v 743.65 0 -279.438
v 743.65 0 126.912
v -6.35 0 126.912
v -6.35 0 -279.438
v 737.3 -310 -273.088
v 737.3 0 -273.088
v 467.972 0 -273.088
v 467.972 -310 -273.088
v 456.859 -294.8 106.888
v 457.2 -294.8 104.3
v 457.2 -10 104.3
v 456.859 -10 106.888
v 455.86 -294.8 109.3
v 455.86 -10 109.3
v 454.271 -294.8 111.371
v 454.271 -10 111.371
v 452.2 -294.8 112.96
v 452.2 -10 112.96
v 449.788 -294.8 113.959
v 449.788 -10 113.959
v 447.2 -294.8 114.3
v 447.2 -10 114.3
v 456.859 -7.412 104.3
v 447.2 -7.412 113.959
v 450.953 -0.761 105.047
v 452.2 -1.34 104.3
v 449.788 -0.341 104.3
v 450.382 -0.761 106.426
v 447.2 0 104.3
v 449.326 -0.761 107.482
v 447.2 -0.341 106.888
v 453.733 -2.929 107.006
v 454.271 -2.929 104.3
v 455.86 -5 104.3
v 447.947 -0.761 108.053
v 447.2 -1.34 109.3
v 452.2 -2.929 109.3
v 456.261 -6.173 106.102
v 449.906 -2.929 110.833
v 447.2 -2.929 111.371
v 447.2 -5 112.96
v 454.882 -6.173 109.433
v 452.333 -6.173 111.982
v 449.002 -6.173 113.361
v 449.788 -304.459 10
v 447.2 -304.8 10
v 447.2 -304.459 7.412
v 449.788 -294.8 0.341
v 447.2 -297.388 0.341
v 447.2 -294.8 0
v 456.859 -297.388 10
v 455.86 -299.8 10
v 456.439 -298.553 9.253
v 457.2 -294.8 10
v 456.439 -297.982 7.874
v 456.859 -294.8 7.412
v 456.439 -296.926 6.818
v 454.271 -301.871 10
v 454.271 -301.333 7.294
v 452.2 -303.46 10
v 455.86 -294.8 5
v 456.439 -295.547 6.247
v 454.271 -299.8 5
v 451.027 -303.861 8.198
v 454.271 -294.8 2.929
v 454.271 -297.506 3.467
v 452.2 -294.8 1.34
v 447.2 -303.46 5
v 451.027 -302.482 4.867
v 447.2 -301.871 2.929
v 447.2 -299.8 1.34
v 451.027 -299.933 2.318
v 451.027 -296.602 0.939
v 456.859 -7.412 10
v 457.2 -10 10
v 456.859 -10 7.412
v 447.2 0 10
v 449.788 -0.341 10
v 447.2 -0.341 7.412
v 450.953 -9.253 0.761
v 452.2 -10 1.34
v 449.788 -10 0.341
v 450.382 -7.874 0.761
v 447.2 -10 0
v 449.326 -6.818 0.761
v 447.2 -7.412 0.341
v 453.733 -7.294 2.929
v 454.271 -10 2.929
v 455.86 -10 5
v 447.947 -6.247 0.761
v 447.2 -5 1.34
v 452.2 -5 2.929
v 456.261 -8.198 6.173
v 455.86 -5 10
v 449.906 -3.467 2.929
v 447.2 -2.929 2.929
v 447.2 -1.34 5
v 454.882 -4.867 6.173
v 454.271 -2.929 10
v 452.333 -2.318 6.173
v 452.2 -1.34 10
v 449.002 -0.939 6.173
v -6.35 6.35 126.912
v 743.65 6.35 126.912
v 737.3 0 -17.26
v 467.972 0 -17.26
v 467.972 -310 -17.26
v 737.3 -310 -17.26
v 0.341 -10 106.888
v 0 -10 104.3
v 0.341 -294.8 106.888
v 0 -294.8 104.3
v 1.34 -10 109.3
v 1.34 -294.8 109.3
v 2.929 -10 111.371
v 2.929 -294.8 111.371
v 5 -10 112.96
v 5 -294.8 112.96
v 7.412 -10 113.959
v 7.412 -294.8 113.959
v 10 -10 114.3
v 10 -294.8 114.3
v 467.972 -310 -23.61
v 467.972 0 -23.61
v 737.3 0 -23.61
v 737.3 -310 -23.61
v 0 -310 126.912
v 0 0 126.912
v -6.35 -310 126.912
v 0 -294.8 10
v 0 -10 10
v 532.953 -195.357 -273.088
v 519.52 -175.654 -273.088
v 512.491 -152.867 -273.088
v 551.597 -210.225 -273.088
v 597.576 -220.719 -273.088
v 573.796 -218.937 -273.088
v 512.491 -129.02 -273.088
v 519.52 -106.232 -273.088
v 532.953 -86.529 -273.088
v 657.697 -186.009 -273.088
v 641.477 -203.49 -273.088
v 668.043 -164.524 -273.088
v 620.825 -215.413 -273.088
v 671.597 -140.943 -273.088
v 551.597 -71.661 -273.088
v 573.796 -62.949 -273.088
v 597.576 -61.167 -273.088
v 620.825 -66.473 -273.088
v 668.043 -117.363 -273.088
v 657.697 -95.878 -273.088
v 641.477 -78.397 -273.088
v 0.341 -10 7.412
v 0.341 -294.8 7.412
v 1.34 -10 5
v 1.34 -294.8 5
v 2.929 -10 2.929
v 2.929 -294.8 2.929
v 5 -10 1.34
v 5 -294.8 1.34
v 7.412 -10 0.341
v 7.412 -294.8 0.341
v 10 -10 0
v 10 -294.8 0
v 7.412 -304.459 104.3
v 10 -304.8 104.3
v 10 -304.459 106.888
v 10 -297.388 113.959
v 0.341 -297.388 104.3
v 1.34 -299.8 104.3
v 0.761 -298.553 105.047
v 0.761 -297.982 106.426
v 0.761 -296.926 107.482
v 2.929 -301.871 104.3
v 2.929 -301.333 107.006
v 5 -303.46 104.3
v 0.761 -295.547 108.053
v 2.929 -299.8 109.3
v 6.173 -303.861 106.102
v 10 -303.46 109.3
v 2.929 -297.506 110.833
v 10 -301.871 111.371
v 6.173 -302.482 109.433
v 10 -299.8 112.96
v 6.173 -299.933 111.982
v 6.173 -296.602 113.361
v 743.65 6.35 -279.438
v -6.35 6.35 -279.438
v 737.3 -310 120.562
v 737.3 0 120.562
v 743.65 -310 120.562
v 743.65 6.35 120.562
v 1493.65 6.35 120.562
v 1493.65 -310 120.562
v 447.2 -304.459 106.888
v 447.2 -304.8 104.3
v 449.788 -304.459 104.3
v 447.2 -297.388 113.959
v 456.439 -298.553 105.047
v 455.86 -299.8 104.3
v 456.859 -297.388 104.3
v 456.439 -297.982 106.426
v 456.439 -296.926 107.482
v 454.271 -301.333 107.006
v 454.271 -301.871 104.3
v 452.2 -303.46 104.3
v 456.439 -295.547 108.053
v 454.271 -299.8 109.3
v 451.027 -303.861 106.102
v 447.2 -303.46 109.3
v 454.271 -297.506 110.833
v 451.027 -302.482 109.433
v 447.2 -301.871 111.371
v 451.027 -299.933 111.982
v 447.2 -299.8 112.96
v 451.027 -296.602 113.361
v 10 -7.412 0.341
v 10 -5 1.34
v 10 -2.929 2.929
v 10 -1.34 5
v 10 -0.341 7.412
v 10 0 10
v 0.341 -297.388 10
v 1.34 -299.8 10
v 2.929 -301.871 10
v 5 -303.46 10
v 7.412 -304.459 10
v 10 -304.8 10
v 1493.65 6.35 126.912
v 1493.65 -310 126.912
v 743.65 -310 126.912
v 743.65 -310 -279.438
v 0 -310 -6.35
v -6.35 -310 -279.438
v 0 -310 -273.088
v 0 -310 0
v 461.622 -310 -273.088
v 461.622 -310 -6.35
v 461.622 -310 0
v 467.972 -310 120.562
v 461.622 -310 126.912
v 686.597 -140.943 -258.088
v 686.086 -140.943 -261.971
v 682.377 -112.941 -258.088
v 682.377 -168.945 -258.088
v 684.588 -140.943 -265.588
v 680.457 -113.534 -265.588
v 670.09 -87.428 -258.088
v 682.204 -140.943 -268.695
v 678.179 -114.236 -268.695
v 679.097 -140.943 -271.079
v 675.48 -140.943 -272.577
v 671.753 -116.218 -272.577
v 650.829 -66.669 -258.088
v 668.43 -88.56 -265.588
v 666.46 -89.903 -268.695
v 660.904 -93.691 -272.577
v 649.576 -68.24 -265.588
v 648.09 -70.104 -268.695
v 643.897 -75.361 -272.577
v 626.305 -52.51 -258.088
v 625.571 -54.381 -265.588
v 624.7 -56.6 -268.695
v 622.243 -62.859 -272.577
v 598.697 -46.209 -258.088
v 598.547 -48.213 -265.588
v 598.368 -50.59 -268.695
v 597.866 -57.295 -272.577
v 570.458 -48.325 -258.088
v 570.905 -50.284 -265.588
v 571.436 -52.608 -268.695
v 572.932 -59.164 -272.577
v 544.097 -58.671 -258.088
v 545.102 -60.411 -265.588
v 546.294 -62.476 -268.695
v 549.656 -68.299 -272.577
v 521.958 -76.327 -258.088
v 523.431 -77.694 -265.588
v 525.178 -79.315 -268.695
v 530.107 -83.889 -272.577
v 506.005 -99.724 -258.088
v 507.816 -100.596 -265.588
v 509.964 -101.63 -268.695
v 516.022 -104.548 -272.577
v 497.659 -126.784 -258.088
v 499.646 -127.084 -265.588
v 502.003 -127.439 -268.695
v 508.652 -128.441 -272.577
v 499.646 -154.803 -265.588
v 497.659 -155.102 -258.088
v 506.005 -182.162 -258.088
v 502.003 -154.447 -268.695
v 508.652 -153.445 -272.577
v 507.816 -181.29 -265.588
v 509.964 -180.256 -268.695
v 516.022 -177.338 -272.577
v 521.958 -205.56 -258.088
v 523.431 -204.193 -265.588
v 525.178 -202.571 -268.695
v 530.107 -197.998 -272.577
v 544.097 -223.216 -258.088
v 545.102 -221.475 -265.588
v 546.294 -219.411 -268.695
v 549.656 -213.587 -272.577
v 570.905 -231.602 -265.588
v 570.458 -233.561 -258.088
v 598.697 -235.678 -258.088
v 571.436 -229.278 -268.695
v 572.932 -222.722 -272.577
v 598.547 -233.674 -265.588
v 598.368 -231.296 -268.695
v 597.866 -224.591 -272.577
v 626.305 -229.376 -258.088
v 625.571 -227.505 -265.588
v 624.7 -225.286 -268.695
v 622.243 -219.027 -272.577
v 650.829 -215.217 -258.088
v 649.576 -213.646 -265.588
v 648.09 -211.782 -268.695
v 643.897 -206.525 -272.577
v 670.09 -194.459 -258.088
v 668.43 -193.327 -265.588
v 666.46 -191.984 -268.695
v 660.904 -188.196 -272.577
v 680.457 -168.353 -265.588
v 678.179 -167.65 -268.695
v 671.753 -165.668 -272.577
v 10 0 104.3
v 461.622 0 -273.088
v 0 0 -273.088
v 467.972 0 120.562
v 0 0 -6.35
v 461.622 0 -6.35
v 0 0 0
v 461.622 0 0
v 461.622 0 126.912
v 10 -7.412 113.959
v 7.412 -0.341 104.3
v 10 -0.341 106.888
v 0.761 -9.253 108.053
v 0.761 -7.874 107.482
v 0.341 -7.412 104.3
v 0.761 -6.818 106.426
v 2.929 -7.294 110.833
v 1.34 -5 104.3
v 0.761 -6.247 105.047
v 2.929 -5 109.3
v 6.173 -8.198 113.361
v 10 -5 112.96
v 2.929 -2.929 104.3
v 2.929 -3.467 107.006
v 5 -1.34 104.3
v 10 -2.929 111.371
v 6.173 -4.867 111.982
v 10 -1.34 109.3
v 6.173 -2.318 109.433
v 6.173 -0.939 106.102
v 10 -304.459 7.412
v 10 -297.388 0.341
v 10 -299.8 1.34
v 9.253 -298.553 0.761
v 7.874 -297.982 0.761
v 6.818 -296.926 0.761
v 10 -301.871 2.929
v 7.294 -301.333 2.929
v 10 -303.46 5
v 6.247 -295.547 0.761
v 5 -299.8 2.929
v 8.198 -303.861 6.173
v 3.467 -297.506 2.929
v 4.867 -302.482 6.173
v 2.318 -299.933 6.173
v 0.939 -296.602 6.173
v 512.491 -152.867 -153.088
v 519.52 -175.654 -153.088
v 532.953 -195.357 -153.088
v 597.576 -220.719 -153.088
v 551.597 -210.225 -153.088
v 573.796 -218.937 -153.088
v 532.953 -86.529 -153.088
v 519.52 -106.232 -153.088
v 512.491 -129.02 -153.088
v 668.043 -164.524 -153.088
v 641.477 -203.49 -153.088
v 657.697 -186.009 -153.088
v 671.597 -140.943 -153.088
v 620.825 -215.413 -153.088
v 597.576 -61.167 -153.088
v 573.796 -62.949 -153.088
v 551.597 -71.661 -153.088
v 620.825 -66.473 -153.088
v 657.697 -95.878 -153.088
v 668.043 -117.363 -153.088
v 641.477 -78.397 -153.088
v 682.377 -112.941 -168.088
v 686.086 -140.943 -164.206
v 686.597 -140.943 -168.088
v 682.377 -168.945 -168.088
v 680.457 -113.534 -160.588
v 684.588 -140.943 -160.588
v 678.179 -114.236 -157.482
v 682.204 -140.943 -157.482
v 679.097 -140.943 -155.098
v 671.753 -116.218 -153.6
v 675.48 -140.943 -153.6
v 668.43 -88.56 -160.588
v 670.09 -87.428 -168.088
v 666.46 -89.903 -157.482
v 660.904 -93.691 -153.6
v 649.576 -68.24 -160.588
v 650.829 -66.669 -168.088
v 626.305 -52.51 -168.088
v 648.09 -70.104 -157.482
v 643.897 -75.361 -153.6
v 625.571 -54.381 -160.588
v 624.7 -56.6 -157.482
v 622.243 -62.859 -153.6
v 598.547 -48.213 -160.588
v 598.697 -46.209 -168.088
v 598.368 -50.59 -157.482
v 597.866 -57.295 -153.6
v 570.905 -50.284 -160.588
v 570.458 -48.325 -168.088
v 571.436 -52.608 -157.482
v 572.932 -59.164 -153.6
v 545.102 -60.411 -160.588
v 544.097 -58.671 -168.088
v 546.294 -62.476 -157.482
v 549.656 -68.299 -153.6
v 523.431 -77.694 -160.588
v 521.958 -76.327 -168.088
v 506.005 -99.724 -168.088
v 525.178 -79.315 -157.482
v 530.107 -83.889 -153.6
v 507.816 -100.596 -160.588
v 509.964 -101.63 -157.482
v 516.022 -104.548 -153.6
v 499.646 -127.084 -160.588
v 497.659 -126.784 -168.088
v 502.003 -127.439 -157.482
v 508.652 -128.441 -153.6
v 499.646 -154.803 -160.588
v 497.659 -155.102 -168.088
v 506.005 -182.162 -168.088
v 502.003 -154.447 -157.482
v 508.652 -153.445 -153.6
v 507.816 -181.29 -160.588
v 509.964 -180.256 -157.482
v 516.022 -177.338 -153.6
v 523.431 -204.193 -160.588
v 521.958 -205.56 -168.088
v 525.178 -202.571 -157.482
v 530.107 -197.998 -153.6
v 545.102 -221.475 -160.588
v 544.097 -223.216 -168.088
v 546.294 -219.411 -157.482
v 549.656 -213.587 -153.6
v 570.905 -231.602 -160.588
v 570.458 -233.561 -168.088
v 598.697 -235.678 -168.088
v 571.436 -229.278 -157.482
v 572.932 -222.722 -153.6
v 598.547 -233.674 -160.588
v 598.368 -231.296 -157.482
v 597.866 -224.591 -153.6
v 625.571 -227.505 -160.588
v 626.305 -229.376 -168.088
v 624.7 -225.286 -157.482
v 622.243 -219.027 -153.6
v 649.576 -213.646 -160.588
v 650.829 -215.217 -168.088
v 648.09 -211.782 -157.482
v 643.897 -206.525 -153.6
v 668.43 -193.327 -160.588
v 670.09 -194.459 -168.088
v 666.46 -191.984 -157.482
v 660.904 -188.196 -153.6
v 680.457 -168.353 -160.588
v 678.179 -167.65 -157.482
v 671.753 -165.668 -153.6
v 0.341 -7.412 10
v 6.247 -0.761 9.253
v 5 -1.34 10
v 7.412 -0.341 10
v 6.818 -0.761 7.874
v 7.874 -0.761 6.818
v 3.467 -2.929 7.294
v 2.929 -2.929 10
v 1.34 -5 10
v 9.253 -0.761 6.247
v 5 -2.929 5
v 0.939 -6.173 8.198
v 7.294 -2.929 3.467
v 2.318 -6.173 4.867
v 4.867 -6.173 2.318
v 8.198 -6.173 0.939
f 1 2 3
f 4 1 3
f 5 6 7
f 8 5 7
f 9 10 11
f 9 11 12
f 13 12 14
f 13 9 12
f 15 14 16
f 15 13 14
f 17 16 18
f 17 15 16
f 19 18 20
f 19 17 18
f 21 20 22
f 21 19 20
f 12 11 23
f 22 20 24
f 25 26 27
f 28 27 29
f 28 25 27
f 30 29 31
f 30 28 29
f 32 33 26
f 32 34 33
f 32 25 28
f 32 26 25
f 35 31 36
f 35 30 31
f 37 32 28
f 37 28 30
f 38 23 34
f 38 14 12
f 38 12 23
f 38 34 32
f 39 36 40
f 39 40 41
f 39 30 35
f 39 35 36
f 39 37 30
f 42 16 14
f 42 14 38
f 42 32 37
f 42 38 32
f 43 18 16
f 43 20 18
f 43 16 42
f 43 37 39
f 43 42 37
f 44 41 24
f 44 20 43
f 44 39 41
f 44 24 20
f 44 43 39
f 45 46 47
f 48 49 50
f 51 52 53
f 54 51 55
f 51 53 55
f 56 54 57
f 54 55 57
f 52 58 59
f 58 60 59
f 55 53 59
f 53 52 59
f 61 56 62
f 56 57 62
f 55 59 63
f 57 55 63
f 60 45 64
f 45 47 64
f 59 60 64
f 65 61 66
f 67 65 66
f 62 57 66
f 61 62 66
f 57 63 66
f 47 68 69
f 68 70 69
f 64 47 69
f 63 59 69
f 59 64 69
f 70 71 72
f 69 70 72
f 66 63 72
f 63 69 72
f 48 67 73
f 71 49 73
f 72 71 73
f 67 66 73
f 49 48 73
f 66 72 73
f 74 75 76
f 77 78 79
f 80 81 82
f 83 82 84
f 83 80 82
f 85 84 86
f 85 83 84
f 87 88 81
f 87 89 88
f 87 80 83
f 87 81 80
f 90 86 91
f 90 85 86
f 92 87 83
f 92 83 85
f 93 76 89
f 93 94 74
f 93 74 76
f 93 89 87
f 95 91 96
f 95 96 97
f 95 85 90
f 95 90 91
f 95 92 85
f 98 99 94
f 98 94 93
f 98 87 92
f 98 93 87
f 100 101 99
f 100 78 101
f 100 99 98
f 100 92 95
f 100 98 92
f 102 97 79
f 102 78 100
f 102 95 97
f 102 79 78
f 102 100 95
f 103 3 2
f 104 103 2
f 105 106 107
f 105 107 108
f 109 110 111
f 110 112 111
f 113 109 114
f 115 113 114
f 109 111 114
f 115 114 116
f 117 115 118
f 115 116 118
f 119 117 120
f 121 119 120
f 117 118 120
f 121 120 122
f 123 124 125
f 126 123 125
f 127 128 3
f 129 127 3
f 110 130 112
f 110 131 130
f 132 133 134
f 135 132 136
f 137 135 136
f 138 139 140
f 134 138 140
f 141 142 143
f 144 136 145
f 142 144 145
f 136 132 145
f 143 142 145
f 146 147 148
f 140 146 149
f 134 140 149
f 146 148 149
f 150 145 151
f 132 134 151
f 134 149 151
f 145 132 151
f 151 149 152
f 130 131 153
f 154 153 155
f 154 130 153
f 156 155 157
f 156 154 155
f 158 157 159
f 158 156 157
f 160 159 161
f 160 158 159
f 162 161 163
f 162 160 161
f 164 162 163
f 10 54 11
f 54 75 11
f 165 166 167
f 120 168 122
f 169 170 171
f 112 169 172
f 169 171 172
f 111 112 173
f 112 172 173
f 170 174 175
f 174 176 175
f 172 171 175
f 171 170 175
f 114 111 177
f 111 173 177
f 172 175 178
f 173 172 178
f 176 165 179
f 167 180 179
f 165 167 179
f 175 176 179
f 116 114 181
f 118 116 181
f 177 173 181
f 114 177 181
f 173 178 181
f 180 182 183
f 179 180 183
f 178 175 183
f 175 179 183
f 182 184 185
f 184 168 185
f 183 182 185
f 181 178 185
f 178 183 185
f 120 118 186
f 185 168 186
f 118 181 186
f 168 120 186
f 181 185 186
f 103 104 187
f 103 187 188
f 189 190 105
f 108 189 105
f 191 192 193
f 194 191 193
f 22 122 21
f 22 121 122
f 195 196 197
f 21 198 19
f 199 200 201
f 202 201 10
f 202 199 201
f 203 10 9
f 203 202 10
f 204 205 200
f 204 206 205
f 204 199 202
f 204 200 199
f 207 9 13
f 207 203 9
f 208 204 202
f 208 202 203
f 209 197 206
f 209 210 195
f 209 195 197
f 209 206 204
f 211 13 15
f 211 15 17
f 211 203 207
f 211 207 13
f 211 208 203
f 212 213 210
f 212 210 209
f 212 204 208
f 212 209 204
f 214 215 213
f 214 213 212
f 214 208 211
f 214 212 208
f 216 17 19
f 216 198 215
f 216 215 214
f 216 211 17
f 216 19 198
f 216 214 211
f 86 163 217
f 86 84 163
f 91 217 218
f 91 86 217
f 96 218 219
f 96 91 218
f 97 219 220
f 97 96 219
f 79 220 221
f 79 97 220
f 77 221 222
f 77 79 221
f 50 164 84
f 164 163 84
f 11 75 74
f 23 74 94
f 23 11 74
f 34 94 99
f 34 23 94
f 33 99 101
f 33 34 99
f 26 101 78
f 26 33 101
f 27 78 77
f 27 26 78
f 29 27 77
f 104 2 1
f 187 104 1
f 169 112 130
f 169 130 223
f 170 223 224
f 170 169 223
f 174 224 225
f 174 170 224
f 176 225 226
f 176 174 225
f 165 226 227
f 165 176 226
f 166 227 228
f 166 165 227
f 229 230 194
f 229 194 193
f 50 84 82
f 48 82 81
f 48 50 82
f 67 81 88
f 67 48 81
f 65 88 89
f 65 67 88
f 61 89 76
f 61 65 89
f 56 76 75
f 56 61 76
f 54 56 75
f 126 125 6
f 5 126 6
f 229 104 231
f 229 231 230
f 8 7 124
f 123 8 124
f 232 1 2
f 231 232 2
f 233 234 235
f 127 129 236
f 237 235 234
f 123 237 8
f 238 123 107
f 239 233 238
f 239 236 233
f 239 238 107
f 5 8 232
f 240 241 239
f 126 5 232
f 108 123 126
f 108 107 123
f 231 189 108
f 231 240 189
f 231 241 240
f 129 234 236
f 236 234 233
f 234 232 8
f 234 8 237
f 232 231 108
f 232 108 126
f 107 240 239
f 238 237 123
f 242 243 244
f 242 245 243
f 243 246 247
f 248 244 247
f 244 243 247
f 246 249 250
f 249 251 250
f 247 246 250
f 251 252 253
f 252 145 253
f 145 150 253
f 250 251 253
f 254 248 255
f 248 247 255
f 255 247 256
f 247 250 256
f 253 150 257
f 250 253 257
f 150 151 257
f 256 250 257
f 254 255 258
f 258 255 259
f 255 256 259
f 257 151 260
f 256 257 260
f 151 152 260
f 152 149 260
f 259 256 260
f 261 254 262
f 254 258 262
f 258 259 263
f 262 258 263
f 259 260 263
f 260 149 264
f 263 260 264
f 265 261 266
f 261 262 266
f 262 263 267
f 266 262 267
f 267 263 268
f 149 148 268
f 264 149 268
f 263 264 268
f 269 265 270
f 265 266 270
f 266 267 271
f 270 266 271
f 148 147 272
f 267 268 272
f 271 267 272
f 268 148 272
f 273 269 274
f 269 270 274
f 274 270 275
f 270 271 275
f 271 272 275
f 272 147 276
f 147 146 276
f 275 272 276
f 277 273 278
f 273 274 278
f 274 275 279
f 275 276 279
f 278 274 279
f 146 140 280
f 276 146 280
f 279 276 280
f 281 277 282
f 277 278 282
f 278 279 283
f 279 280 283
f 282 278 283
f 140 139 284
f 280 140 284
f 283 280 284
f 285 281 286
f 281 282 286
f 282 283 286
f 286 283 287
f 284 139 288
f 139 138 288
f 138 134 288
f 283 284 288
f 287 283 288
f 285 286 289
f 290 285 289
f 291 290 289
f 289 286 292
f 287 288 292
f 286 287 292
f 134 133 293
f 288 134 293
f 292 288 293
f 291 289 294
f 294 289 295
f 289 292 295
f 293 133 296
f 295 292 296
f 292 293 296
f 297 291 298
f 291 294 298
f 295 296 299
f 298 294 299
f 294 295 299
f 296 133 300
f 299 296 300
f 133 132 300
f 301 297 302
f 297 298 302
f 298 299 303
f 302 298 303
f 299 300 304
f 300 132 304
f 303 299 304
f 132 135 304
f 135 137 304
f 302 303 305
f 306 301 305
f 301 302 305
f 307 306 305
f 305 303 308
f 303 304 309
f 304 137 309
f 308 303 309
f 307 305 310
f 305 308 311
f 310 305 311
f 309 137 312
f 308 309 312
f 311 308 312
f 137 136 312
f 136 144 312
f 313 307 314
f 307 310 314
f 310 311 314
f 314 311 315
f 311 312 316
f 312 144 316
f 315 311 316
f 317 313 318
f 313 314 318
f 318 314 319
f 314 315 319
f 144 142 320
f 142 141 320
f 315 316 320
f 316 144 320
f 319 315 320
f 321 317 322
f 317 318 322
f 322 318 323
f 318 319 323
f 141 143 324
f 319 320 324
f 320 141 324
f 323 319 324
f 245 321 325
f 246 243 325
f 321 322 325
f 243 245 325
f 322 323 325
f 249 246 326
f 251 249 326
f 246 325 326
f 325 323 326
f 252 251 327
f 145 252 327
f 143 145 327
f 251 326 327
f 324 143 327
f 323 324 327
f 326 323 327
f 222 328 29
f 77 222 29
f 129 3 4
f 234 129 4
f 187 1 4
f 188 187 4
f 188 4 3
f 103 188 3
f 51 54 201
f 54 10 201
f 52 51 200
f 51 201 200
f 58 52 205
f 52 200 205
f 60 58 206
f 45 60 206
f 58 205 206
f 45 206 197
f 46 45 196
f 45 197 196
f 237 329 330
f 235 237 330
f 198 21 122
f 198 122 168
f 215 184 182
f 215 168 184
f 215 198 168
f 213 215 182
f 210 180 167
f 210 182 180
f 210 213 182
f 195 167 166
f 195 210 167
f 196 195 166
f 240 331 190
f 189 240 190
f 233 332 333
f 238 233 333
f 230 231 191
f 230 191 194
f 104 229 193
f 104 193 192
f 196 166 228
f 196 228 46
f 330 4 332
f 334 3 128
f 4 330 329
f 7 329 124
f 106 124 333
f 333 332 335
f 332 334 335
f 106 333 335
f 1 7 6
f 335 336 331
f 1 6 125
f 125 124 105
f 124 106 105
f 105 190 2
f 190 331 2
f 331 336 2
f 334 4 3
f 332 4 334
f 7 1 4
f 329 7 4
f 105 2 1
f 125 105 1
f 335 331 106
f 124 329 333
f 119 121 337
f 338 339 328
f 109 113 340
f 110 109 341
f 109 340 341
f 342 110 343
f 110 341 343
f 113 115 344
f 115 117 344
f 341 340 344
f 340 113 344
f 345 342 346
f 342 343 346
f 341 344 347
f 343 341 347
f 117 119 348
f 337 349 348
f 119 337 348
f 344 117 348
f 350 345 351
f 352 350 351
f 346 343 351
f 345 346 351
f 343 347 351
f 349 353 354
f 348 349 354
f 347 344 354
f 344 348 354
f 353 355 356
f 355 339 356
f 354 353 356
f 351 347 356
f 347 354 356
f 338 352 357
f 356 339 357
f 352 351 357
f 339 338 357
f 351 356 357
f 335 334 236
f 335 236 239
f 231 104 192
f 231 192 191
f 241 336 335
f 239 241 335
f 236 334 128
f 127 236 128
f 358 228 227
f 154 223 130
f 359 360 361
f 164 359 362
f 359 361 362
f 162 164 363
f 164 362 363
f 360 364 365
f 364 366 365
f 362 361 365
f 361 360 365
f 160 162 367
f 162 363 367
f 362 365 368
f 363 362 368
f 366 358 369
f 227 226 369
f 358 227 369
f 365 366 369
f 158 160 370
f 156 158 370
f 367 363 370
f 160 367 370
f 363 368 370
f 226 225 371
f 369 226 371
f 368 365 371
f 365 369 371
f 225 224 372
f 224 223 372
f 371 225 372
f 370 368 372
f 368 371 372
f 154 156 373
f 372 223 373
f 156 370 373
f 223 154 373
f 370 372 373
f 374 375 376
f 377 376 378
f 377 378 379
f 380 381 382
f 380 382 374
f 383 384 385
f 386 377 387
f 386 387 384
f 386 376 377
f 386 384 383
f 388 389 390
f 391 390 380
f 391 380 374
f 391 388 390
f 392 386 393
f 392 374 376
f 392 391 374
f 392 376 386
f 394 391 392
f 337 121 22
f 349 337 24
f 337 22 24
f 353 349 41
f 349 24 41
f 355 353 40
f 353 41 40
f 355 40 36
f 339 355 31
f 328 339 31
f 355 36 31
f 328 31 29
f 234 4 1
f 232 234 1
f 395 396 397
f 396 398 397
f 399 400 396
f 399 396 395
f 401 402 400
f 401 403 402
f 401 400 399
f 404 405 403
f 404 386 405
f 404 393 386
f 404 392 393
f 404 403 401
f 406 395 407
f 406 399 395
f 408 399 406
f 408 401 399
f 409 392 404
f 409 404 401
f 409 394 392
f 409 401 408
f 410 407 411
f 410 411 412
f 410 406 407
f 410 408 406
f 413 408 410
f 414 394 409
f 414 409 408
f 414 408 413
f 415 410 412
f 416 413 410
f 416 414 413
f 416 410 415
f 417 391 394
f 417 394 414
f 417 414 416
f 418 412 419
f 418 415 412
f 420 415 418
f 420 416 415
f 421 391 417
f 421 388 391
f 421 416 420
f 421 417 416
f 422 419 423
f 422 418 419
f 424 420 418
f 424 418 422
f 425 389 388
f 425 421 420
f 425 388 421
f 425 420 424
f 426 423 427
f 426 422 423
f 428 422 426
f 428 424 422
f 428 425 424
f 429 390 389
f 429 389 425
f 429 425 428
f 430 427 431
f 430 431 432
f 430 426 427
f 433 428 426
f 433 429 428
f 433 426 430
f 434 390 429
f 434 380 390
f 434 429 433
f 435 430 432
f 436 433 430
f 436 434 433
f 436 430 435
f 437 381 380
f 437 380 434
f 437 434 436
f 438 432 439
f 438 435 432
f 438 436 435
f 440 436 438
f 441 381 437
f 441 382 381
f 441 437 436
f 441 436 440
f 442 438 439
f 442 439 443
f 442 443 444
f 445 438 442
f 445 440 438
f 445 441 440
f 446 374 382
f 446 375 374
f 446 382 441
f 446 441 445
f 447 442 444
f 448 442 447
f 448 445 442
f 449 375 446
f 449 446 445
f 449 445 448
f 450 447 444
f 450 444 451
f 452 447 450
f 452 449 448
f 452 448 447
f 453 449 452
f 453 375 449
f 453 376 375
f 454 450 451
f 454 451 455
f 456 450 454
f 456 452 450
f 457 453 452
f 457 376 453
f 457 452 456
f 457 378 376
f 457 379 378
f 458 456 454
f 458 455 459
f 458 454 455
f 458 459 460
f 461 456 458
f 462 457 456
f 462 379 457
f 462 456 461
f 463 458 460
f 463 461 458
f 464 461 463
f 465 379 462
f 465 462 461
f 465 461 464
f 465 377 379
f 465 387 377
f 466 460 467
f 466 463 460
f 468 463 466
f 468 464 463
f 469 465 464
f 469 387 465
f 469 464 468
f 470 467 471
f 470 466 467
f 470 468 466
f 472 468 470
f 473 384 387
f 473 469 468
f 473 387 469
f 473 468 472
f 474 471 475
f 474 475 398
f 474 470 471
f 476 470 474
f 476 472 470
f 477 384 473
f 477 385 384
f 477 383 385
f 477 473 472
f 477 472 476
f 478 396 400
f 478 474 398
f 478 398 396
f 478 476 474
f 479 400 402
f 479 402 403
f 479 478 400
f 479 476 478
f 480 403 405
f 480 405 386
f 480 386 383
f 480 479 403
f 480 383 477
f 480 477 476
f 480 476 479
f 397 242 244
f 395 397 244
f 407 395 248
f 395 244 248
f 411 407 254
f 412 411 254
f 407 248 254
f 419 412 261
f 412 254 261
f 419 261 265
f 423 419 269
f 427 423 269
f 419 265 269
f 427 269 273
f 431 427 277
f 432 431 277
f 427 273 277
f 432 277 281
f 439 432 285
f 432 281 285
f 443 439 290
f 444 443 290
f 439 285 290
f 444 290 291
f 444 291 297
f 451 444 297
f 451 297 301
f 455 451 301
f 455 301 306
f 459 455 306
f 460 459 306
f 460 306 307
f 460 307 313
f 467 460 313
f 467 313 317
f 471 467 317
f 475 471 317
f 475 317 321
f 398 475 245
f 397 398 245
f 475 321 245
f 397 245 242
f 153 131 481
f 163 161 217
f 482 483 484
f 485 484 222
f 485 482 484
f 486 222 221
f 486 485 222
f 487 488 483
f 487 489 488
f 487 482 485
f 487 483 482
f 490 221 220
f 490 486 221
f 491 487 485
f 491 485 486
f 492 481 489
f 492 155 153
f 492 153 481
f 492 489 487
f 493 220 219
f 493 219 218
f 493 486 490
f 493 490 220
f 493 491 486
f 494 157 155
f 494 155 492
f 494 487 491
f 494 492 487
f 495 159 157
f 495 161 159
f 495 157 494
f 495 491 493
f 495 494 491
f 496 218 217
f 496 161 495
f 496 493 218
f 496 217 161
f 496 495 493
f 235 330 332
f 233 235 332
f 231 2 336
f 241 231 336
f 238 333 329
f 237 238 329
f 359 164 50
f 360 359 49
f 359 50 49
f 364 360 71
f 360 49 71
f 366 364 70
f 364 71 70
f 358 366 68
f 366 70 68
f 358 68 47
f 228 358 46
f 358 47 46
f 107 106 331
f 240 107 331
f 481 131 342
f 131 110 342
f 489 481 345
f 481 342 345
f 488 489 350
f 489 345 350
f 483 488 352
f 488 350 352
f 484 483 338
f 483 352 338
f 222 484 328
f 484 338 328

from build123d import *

# Parameters (mm, degrees)
F0_W      = 457.2
F0_H      = 114.3
F1_DEPTH  = 304.8
F2_R      = 10
F3_W      = 461.6222679615
F3_H      = 6.35
F3_W_2    = 269.3277320385
F4_DEPTH  = 310
F5_W      = 269.3277320385
F5_H      = 249.4785221457
F5_W_2    = 461.6222679615
F5_H_2    = 266.7384211302
F5_H_3    = 137.8214778543
F5_H_4    = 126.9115788698
F6_DEPTH  = 6.35
F7_R      = 95
F8_DEPTH  = 120
F9_R      = 15
F11_DEPTH = 6.35


# Not quite as in the source:
# - a length typed as a fraction of an inch, garbled in the dataset ("3 / 203.2 mm" for 3/8 in), is restored


with BuildPart() as f1:
    # F0 (on Front) → F1 (new body)
    with BuildSketch(Plane.XZ):
        with Locations((228.6, 57.15)):
            Rectangle(F0_W, F0_H)
    extrude(amount=F1_DEPTH)

    # F2
    f2_edges = [f1.edges().sort_by_distance(p)[0] for p in [
        (228.6, -304.8, 114.3),
        (0, -304.8, 57.15),
        (228.6, -304.8, 0),
        (457.2, -304.8, 57.15),
        (457.2, -152.4, 114.3),
        (457.2, 0, 57.15),
        (457.2, -152.4, 0),
        (228.6, 0, 114.3),
        (0, -152.4, 114.3),
        (0, -152.4, 0),
        (0, 0, 57.15),
        (228.6, 0, 0),
    ]]
    fillet(f2_edges, radius=F2_R)


with BuildPart() as f4:
    # F3 (on Front) → F4 (new body)
    with BuildSketch(Plane.XZ):
        Polygon((0, 126.9115788698), (-6.35, 126.9115788698), (-6.35, -273.0884211302), (0, -273.0884211302), (0, -6.35), (0, 0), align=None)
        Polygon((0, -273.0884211302), (-6.35, -273.0884211302), (-6.35, -279.4384211302), (743.65, -279.4384211302), (743.65, -273.0884211302), (737.3, -273.0884211302), (467.9722679615, -273.0884211302), (461.6222679615, -273.0884211302), align=None)
        Polygon((737.3, -273.0884211302), (743.65, -273.0884211302), (743.65, 126.9115788698), (737.3, 126.9115788698), (737.3, 120.5615788698), (737.3, -17.2598989844), (737.3, -23.6098989844), align=None)
        Polygon((461.6222679615, 126.9115788698), (461.6222679615, 0), (461.6222679615, -6.35), (461.6222679615, -273.0884211302), (467.9722679615, -273.0884211302), (467.9722679615, -23.6098989844), (467.9722679615, -17.2598989844), (467.9722679615, 120.5615788698), (467.9722679615, 126.9115788698), align=None)
        with Locations((230.8111339808, -3.175)):
            Rectangle(F3_W, F3_H)
        with Locations((602.6361339808, -20.4348989844)):
            Rectangle(F3_W_2, F3_H)
        with Locations((602.6361339808, 123.7365788698)):
            Rectangle(F3_W_2, F3_H)
    extrude(amount=F4_DEPTH)


with BuildPart() as f6:
    # F5 (on face) → F6 (new body)
    with BuildSketch(Plane(origin=(0, 0, 0), x_dir=(-1, 0, 0), z_dir=(0, 1, 0))):
        Polygon((-461.6222679615, 126.9115788698), (-743.65, 126.9115788698), (-743.65, -279.4384211302), (6.35, -279.4384211302), (6.35, 126.9115788698), (0, 126.9115788698), (0, 0), (-461.6222679615, 0), align=None)
        with Locations((-602.6361339808, -148.3491600573)):
            Rectangle(F5_W, F5_H, mode=Mode.SUBTRACT)
        with Locations((-230.8111339808, -139.7192105651)):
            Rectangle(F5_W_2, F5_H_2, mode=Mode.SUBTRACT)
        with Locations((-602.6361339808, 51.6508399427)):
            Rectangle(F5_W, F5_H_3, mode=Mode.SUBTRACT)
        with Locations((-230.8111339808, 63.4557894349)):
            Rectangle(F5_W_2, F5_H_4)
        with Locations((-602.6361339808, 51.6508399427)):
            Rectangle(F5_W, F5_H_3)
        with Locations((-602.6361339808, -148.3491600573)):
            Rectangle(F5_W, F5_H)
        with Locations((-230.8111339808, -139.7192105651)):
            Rectangle(F5_W_2, F5_H_2)
    extrude(amount=F6_DEPTH)


with BuildPart() as f8:
    # F7 (on face) → F8 (new body)
    with BuildSketch(Plane.XY.offset(-273.0884211302)):
        with Locations((591.5974378586, -140.943184495)):
            Circle(F7_R)
    extrude(amount=F8_DEPTH)

    # F9
    f9_edges = [f8.edges().sort_by_distance(p)[0] for p in [
        (496.597438, -140.943184, -153.088421),
        (496.597438, -140.943184, -273.088421),
    ]]
    fillet(f9_edges, radius=F9_R)


with BuildPart() as f11:
    # F10 (on face) → F11 (new body)
    with BuildSketch(Plane.XY.offset(126.9115788698)):
        Polygon((1493.65, 6.35), (743.65, 6.35), (743.65, 0), (743.65, -310), (1493.65, -310), align=None)
    extrude(amount=-F11_DEPTH)


solid = Compound([f1.part, f4.part, f6.part, f8.part, f11.part])
